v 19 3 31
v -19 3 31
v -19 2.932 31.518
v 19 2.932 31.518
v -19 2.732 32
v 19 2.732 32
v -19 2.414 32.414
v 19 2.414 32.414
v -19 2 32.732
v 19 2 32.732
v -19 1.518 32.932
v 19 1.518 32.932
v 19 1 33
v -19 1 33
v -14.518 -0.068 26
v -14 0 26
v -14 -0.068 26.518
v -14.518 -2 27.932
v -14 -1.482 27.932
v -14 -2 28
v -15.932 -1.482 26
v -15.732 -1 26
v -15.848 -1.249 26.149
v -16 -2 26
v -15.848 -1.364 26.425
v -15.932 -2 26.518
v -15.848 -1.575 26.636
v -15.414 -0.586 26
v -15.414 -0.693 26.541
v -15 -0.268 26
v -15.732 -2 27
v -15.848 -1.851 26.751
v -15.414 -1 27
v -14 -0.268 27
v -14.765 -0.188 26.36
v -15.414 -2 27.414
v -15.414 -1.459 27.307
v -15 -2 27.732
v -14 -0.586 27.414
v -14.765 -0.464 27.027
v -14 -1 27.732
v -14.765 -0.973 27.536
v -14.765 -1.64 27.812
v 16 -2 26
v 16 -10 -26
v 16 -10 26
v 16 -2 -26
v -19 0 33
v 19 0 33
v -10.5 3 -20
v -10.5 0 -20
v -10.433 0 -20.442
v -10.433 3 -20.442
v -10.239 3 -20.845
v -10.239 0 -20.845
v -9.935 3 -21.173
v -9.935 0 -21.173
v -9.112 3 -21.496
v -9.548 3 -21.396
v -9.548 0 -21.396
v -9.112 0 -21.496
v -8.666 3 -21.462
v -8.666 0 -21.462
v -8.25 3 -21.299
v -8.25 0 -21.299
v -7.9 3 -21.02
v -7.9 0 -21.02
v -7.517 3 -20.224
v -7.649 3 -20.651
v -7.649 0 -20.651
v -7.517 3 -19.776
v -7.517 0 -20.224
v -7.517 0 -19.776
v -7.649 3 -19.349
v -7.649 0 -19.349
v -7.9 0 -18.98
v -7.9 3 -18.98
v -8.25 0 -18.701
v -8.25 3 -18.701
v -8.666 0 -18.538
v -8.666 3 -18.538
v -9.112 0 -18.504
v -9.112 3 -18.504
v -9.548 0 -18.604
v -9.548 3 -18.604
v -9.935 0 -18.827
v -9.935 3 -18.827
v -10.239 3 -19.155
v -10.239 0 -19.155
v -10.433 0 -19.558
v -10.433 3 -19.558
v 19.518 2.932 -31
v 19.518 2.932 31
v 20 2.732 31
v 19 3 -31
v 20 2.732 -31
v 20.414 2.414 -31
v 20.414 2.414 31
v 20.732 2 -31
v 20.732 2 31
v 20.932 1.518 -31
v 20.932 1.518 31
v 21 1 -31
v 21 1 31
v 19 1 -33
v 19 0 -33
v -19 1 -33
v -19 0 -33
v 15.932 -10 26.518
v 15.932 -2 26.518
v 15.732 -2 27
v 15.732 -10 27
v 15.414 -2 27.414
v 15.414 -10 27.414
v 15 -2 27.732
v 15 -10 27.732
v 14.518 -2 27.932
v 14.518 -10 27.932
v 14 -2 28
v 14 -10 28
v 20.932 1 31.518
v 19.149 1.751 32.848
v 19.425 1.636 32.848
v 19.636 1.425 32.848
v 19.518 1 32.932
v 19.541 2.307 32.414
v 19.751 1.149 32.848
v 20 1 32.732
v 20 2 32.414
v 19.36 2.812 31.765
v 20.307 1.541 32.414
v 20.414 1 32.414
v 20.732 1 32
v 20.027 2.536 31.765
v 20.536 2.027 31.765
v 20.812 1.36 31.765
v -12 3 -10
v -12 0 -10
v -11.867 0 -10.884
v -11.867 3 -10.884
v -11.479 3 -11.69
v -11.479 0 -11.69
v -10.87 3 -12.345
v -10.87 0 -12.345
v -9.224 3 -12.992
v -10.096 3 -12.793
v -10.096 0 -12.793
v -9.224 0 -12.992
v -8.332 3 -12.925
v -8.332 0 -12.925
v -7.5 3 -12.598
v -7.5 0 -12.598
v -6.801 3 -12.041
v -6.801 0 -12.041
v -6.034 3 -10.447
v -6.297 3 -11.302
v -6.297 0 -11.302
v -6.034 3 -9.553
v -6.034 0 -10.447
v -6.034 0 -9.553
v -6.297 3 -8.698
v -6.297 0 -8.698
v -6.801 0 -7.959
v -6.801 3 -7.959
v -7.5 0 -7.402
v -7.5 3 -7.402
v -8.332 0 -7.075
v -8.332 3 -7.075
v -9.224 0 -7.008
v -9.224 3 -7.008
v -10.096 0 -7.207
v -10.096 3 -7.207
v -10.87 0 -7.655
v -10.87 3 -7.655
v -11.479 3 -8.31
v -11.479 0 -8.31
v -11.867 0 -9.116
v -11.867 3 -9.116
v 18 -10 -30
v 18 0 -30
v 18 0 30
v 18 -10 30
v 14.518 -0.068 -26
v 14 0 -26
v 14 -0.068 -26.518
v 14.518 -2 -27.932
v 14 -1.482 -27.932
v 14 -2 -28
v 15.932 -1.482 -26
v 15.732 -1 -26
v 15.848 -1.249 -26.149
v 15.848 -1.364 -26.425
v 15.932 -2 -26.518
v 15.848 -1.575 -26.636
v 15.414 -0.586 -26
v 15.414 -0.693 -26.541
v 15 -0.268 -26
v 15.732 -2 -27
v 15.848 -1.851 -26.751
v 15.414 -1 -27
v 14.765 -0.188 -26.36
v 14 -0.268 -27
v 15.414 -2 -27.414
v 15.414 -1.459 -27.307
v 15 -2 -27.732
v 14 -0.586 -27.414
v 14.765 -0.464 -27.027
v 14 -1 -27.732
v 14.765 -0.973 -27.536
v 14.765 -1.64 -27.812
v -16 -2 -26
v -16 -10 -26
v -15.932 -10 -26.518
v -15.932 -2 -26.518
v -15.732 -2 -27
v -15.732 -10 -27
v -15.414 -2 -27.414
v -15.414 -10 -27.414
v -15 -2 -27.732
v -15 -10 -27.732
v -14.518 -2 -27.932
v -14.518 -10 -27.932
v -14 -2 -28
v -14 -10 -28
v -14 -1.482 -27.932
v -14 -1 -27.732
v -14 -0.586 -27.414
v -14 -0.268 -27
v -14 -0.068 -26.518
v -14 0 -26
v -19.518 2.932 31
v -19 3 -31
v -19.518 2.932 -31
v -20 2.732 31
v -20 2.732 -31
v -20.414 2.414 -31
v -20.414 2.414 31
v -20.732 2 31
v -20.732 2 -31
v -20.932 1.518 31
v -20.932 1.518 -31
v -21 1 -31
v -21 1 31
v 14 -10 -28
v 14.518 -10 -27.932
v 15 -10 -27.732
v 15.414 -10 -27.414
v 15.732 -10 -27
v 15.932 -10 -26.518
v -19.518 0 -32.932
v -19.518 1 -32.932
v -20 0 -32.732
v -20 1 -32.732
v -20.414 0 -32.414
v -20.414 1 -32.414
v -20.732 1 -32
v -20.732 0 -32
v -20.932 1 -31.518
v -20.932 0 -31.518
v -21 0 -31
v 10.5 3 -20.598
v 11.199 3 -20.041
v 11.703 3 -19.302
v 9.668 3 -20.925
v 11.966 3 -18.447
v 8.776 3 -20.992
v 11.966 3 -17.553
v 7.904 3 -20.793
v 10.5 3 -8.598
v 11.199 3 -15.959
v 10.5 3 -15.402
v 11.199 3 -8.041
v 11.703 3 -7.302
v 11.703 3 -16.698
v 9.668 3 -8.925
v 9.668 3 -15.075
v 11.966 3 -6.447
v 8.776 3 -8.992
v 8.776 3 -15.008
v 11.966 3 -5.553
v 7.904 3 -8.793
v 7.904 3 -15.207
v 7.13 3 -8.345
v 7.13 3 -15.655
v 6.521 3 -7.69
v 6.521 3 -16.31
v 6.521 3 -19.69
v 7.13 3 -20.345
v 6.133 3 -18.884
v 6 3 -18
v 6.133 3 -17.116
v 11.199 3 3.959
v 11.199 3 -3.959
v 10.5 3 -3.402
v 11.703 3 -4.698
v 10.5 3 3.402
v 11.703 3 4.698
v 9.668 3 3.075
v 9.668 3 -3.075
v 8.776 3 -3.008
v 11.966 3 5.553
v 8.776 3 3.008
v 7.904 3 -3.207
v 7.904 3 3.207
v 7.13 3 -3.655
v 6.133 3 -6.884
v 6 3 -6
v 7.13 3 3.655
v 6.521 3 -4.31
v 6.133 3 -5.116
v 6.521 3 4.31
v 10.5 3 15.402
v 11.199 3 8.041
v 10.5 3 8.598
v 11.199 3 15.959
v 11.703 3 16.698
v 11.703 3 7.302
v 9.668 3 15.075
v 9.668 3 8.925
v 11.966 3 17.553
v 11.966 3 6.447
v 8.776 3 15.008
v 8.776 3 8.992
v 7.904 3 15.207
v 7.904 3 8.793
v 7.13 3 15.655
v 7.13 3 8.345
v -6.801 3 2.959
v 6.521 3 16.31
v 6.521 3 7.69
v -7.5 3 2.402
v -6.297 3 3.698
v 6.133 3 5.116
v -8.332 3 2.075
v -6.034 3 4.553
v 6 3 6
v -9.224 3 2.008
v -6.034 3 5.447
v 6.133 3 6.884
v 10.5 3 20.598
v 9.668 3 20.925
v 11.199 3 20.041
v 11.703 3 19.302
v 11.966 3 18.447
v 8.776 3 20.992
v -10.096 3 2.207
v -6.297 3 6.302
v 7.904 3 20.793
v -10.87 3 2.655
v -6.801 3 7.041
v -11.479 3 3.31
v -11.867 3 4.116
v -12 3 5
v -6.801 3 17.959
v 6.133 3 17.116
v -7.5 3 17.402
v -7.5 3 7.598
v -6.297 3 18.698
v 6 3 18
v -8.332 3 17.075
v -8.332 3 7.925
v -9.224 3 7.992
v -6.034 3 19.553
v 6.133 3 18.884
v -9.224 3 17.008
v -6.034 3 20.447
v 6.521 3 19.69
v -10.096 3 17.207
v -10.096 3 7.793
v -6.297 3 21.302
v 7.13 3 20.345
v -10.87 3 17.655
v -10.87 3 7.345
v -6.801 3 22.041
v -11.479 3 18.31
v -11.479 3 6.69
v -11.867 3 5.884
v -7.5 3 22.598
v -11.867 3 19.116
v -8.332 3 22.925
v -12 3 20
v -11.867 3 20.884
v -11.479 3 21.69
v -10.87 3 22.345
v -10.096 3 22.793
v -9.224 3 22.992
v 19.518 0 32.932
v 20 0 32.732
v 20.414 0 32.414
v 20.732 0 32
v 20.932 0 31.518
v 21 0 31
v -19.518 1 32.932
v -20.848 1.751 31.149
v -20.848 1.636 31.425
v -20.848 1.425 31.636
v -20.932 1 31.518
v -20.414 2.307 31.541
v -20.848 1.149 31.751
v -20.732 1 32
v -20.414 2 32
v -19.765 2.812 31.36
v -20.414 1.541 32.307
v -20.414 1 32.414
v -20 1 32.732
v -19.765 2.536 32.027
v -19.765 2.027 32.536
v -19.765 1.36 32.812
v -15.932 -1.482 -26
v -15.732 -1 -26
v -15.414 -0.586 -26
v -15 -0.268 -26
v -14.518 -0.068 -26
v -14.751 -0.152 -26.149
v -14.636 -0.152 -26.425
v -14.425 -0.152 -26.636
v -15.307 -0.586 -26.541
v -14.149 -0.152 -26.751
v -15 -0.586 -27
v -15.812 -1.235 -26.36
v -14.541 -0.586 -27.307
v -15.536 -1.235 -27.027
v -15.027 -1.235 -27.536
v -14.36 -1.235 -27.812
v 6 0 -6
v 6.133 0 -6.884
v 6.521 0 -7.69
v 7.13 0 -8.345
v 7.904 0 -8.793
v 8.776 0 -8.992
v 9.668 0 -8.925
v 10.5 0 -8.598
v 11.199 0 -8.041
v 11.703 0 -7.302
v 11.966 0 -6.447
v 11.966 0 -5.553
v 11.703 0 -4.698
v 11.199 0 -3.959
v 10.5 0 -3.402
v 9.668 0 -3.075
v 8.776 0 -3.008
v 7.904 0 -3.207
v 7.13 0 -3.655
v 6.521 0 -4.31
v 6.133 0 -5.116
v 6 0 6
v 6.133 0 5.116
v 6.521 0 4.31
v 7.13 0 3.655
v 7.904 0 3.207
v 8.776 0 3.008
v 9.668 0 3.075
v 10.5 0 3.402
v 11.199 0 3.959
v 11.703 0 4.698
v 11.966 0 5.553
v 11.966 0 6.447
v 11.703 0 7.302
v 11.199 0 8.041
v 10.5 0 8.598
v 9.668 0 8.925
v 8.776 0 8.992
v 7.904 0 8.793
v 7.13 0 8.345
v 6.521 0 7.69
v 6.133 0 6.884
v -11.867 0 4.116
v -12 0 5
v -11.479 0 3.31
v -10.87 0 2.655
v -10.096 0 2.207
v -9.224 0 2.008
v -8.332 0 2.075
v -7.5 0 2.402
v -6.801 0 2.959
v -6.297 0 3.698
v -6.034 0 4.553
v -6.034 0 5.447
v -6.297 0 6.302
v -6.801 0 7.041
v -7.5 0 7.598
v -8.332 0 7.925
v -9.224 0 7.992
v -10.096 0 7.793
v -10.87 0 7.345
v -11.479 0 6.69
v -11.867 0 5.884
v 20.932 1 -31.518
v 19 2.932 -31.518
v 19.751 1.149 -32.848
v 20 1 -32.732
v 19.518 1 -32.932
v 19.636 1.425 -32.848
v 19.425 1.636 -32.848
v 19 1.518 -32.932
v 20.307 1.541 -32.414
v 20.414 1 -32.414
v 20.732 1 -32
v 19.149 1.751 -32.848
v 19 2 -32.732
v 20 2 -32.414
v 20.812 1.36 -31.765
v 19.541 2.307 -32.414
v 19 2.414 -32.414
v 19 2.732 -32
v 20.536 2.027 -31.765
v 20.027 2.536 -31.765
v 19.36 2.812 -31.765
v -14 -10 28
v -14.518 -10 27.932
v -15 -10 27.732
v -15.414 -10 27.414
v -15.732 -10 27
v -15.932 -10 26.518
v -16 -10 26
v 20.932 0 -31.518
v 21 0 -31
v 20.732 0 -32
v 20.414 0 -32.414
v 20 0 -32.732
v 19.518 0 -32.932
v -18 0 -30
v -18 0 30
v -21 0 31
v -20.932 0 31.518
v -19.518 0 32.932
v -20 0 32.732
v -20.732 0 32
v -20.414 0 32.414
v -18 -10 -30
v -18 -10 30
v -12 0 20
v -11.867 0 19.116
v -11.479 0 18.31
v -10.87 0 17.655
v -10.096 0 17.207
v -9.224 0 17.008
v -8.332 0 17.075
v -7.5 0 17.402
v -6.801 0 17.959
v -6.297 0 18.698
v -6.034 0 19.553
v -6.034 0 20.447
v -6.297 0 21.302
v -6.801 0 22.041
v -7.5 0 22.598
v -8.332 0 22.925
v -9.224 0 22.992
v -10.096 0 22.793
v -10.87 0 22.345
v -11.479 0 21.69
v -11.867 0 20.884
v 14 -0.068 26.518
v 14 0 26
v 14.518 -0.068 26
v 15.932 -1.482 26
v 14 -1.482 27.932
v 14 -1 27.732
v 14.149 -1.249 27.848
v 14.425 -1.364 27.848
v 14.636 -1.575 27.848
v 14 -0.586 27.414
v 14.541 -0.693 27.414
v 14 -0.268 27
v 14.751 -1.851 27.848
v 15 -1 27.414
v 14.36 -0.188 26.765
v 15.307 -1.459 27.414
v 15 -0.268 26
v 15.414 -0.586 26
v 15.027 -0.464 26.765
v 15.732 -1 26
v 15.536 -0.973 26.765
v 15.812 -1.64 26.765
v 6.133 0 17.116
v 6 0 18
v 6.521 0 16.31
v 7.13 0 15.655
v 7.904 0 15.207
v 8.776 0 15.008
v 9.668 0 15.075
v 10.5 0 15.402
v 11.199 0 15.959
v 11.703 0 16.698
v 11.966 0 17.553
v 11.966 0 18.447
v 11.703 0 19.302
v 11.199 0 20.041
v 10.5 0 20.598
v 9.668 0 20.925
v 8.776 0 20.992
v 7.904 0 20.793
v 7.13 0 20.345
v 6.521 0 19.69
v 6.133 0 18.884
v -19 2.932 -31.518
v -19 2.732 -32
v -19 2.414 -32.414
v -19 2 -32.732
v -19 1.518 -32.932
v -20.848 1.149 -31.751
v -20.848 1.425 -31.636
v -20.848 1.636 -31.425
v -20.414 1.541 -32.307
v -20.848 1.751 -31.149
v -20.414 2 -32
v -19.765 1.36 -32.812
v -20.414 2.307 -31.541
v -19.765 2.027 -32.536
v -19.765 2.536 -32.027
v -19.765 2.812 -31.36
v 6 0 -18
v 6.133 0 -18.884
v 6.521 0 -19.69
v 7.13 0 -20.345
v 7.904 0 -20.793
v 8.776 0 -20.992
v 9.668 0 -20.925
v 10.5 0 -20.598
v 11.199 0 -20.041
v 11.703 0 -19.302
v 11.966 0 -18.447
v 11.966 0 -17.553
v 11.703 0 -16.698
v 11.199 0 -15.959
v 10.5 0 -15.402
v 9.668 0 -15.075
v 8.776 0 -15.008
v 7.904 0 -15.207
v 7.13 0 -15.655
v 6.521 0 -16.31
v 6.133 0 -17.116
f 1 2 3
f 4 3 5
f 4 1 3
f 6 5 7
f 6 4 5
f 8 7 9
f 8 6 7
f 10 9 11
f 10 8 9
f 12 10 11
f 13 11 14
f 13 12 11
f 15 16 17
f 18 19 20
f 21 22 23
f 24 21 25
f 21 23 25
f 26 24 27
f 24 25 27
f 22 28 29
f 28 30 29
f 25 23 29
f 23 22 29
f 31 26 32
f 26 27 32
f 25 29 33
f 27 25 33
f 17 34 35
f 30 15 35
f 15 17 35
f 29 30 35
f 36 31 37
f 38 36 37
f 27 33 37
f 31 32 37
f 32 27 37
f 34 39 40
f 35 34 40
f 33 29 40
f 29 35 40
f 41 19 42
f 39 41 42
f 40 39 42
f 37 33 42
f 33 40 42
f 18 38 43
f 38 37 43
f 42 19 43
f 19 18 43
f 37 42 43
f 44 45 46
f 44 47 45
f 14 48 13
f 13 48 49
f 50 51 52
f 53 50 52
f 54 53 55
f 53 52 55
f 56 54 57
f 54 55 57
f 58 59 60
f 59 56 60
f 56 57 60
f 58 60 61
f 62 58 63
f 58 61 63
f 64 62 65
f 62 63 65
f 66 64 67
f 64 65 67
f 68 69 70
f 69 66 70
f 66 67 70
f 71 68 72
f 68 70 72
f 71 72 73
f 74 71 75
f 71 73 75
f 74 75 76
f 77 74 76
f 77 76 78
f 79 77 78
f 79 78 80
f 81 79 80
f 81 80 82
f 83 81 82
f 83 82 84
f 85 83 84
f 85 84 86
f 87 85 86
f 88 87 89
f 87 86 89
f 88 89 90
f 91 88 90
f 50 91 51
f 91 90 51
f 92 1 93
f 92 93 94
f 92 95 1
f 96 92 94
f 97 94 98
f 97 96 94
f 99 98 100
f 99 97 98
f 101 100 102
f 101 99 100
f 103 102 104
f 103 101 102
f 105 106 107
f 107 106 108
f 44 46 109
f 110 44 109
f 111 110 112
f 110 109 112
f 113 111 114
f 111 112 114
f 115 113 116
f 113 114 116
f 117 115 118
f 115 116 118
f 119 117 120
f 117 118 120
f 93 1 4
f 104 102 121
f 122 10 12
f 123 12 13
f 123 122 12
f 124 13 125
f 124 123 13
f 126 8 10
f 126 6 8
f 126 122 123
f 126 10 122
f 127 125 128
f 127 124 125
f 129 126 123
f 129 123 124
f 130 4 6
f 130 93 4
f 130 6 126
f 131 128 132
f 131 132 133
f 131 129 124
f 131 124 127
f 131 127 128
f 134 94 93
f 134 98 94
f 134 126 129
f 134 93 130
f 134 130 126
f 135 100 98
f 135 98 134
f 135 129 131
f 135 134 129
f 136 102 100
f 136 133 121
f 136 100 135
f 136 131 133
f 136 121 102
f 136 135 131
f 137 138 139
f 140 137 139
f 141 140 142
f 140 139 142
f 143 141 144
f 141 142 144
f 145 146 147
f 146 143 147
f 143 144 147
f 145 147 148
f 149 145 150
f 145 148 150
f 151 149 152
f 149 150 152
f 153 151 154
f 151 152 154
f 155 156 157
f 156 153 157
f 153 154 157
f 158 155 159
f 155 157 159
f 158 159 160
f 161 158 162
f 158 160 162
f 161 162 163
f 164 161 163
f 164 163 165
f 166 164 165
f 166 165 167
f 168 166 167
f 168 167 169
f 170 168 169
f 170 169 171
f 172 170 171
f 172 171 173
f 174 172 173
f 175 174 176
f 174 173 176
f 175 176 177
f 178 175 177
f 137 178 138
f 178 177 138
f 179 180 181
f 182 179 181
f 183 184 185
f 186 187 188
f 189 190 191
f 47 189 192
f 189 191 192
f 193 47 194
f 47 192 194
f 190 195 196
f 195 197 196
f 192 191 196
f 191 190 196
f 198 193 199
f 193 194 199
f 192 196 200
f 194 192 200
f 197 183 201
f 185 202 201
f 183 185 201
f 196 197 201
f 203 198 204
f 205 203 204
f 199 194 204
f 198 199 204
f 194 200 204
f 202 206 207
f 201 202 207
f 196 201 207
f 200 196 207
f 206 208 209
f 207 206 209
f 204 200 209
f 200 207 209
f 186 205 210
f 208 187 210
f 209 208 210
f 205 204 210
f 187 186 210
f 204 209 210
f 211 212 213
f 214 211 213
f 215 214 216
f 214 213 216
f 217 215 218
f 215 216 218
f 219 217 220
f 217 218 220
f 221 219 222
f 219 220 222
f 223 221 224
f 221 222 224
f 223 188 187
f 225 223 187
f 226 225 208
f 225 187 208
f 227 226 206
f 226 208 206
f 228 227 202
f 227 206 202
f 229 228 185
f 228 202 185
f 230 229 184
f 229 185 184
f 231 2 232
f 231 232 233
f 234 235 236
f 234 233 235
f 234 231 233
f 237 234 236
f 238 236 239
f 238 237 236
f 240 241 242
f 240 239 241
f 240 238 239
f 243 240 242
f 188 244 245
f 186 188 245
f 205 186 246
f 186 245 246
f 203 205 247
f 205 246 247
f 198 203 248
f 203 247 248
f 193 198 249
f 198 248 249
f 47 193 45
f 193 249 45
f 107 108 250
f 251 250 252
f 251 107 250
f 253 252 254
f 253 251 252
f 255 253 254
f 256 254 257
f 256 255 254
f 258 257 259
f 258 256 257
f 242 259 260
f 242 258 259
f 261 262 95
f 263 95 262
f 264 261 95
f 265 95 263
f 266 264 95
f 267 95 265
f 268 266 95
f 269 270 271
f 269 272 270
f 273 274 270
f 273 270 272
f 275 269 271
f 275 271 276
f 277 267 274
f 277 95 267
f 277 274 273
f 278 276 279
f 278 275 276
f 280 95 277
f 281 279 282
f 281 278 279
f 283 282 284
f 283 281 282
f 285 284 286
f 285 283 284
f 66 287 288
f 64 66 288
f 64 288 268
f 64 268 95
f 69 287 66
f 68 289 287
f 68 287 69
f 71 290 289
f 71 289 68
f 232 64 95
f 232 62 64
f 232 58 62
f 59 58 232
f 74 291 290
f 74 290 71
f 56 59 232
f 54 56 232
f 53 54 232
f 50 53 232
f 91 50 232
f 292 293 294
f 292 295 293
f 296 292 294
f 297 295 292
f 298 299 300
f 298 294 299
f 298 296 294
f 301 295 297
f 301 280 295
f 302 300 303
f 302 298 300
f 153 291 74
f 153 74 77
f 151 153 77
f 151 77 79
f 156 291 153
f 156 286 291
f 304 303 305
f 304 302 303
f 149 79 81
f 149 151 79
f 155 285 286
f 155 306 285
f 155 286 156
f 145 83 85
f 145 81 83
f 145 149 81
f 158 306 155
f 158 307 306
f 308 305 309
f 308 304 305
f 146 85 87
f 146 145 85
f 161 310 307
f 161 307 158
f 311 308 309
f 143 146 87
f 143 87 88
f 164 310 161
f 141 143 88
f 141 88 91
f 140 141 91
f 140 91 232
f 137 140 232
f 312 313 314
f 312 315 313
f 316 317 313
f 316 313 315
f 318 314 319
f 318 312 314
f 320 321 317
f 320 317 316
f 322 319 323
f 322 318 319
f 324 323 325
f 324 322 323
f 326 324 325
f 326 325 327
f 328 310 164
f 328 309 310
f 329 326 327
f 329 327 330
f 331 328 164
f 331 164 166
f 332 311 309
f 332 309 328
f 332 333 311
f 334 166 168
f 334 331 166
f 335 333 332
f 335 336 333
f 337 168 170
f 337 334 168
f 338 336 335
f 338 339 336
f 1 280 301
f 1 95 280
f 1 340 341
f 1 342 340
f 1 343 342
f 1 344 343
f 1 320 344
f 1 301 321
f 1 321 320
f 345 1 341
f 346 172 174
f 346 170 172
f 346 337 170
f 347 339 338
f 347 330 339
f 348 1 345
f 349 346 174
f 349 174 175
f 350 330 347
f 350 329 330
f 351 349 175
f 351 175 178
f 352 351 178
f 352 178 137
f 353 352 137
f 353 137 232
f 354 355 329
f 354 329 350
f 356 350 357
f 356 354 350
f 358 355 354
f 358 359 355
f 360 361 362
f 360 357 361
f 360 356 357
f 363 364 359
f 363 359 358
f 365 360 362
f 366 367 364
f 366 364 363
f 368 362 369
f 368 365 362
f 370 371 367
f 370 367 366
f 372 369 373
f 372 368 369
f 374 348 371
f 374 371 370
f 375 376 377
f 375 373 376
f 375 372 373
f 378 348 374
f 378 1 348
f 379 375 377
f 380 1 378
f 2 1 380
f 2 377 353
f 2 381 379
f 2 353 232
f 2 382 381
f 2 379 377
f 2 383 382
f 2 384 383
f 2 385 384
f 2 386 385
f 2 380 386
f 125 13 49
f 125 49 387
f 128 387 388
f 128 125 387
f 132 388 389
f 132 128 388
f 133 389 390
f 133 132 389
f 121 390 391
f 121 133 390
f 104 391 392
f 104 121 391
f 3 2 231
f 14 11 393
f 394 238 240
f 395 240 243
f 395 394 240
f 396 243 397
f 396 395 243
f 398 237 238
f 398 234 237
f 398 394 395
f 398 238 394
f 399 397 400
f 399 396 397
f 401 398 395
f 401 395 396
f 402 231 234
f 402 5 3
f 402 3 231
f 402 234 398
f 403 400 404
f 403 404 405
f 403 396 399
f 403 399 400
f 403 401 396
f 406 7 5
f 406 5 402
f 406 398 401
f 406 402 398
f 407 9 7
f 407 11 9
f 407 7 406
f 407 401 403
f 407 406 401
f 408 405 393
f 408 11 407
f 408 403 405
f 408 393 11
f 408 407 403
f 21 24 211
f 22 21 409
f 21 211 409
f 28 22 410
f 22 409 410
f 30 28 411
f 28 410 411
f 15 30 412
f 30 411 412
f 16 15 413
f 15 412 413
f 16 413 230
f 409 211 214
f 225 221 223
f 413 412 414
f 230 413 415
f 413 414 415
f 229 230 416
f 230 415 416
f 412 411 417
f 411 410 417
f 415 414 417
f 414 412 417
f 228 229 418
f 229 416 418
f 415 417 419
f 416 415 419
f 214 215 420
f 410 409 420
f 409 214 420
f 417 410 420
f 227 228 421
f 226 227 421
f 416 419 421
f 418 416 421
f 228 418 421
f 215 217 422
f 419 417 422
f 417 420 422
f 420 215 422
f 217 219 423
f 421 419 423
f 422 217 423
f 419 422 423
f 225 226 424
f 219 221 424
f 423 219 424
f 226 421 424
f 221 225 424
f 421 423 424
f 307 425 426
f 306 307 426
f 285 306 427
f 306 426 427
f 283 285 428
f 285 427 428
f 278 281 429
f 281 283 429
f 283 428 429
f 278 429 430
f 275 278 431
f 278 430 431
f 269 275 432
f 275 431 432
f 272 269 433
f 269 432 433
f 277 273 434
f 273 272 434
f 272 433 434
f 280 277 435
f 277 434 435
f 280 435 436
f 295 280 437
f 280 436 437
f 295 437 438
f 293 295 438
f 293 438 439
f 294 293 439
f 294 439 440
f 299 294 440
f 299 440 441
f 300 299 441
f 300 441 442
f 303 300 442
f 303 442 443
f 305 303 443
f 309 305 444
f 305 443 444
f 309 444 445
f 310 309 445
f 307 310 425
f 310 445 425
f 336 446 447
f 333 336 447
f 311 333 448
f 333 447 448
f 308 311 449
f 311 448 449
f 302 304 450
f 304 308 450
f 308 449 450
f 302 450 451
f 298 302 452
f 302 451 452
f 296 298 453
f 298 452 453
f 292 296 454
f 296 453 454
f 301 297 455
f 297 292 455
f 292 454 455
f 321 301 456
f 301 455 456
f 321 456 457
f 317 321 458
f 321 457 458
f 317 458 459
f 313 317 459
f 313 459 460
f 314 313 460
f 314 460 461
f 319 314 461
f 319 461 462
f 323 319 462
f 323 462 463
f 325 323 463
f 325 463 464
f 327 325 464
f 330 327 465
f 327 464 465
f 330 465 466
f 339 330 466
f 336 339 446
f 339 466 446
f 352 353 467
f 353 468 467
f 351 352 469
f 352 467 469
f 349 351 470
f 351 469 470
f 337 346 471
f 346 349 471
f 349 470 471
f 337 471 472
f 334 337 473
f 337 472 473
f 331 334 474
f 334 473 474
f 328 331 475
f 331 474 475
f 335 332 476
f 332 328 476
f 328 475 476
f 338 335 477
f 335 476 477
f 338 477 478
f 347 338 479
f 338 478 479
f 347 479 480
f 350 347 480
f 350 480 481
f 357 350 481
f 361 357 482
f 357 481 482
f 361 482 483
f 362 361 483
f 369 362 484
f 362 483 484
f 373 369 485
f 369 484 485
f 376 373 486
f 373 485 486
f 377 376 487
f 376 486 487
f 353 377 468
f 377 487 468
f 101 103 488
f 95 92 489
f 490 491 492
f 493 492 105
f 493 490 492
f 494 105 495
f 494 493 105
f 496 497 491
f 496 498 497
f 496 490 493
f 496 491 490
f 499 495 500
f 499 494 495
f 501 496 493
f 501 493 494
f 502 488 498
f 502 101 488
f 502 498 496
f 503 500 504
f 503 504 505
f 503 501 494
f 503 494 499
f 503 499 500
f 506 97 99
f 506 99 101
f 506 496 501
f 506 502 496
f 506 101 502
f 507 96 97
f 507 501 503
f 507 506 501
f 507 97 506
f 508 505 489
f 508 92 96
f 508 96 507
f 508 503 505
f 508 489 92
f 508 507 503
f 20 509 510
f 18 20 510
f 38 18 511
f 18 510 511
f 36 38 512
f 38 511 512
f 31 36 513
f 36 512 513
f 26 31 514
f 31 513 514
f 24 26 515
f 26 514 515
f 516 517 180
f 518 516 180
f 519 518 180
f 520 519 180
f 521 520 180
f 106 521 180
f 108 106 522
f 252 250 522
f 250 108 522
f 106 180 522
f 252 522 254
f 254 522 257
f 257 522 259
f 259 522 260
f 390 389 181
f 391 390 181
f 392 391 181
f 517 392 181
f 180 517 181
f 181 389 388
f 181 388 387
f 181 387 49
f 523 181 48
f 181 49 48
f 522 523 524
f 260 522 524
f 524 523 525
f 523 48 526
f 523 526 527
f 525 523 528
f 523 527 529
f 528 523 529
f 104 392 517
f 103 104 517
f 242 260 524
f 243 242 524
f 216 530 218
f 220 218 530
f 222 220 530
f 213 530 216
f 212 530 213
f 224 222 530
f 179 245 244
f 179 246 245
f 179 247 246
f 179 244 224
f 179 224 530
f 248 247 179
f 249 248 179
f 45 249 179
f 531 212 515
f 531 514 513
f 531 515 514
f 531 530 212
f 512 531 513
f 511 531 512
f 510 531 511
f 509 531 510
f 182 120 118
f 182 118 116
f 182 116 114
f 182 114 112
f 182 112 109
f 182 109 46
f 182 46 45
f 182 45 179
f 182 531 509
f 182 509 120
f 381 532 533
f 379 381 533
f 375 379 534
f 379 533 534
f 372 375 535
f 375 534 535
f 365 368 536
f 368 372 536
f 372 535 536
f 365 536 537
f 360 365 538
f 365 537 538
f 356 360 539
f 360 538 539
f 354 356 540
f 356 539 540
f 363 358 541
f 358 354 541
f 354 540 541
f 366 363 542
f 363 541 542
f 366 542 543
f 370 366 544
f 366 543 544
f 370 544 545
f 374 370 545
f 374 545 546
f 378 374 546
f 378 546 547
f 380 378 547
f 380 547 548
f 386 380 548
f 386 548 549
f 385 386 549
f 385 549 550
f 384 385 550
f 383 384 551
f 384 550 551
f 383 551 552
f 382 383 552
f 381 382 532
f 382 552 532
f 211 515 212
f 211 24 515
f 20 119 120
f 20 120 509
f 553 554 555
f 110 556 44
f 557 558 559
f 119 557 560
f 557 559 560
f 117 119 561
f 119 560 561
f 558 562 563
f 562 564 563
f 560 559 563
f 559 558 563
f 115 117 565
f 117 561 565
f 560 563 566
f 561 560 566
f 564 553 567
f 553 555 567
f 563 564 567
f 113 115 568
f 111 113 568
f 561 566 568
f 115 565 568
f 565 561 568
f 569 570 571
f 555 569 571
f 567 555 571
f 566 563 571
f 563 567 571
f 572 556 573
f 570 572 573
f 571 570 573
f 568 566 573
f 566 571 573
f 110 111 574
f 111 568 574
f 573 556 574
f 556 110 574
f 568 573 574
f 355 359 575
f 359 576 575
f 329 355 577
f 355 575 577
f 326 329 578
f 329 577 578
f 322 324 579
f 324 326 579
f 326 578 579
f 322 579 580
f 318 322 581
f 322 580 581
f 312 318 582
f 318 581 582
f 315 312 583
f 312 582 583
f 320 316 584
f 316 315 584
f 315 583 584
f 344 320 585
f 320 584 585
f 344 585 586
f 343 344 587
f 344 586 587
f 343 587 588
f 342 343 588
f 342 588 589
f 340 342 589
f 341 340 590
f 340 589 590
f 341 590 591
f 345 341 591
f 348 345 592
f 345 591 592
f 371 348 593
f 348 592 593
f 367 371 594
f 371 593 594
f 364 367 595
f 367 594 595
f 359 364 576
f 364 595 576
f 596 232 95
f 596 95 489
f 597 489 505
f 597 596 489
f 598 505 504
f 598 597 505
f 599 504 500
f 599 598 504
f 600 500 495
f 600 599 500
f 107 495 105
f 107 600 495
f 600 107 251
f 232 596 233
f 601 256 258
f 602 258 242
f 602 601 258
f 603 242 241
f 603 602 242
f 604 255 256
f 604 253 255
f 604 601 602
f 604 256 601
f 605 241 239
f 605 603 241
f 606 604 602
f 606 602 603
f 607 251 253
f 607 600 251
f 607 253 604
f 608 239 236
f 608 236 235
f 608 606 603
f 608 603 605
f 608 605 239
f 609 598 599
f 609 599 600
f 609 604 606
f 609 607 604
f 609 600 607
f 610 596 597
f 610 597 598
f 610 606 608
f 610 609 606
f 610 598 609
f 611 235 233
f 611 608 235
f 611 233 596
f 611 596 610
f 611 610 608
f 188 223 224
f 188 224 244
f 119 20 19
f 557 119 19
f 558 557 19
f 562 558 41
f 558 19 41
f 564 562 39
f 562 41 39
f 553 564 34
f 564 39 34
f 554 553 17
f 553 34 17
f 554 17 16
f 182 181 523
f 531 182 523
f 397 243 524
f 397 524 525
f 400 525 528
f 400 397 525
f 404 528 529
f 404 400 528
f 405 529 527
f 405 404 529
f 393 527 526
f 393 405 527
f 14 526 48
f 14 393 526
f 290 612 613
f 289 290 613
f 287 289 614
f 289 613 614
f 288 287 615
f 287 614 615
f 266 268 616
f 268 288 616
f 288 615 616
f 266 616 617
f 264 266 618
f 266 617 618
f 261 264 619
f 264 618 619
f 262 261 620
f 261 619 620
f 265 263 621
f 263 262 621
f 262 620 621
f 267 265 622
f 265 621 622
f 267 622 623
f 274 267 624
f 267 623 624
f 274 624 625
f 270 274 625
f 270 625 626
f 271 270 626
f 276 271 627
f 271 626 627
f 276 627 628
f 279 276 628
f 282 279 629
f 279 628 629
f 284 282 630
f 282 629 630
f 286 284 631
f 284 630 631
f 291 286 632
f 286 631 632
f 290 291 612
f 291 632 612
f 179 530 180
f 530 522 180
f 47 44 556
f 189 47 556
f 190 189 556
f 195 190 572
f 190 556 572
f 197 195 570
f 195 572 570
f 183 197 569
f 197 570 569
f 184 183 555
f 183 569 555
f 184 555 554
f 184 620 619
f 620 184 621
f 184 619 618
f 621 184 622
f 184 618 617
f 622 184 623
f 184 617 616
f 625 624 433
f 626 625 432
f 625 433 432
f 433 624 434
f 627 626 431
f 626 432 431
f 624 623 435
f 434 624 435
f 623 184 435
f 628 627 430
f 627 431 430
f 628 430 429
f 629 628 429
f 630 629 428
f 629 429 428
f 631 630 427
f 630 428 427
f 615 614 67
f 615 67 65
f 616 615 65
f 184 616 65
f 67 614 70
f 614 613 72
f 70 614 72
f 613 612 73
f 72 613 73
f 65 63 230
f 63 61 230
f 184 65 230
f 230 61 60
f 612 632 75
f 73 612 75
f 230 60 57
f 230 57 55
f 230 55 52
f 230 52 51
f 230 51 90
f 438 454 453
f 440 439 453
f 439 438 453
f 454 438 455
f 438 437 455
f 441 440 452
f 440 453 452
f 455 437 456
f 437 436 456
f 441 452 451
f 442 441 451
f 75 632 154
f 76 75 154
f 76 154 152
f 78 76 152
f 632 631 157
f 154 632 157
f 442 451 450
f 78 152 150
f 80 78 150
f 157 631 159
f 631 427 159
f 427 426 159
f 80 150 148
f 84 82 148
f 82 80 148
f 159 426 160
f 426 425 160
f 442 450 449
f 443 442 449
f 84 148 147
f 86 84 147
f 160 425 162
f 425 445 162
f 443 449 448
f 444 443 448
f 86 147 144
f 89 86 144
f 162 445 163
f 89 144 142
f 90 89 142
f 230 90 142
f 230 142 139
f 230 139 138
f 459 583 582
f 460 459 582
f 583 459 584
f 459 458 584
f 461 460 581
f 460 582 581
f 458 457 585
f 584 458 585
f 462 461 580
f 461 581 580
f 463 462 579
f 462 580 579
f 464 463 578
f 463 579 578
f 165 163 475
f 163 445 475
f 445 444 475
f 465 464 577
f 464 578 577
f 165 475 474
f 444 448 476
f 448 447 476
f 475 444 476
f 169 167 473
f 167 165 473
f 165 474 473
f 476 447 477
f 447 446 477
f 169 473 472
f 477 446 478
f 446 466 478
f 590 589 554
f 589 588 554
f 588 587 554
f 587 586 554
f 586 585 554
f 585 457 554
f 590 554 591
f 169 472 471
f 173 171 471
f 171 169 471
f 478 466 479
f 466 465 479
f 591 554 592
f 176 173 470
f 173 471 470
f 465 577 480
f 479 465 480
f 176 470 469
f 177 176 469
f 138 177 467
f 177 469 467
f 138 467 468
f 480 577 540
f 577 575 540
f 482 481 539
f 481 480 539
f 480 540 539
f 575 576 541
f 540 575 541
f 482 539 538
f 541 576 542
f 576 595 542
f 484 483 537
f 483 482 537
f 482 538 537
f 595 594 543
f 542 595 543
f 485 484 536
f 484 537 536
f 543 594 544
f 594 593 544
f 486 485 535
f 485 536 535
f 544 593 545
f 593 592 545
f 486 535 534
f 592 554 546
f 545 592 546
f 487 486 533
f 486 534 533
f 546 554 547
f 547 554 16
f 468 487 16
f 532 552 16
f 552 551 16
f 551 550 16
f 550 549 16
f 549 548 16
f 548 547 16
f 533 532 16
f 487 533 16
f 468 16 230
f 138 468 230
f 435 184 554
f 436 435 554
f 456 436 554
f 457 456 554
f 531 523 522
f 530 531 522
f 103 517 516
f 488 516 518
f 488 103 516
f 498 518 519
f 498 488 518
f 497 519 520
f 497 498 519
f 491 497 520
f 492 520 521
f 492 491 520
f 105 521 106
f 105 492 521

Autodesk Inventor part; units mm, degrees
ref_plane "YZ Plane" through (0, 0, 0) normal (1, 0, 0) x (0, 1, 0)
ref_plane "XZ Plane" through (0, 0, 0) normal (0, 1, 0) x (-1, 0, 0)
ref_plane "XY Plane" through (0, 0, 0) normal (0, 0, 1) x (1, 0, 0)
sketch "Sketch1" plane through (0, 0, 0) normal (0, 1, 0) x (-1, 0, 0)
  line L0 (18, 30) -> (-18, 30)
  line L1 (-18, 30) -> (-18, -30)
  line L2 (-18, -30) -> (18, -30)
  line L3 (18, -30) -> (18, 30)
  line L4 (18, 30) -> (-18, -30) construction
  line L5 (-18, 30) -> (18, -30) construction
  circle A0 centre (9, 20) radius 3
  circle A1 centre (9, 5) radius 3
  circle A2 centre (-9, 18) radius 3
  circle A3 centre (-9, 6) radius 3
  circle A4 centre (-9, -6) radius 3
  circle A5 centre (-9, -18) radius 3
  circle A6 centre (9, -10) radius 3
  circle A7 centre (9, -20) radius 1.5
  line L6 (21, 33) -> (-21, 33)
  line L7 (-21, 33) -> (-21, -33)
  line L8 (-21, -33) -> (21, -33)
  line L9 (21, -33) -> (21, 33)
  line L10 (21, 33) -> (-21, -33) construction
  line L11 (-21, 33) -> (21, -33) construction
  point P0 (0, 0)
  dimension "d0" = 36
  dimension "d1" = 60
  dimension "d2" = 6
  dimension "d3" = 6
  dimension "d4" = 6
  dimension "d5" = 6
  dimension "d6" = 6
  dimension "d7" = 6
  dimension "d8" = 6
  dimension "d9" = 3
  dimension "d10" = 10
  dimension "d11" = 5
  dimension "d12" = 9
  dimension "d13" = 9
  dimension "d14" = 9
  dimension "d15" = 9
  dimension "d16" = 10
  dimension "d17" = 10
  dimension "d18" = 9
  dimension "d19" = 9
  dimension "d20" = 9
  dimension "d21" = 9
  dimension "d22" = 12
  dimension "d23" = 12
  dimension "d24" = 12
  dimension "d25" = 12
  dimension "d26" = 3
  dimension "d27" = 3
extrude "Extrusion1" add sketch "Sketch1" along normal blind 3 contours L3 L2 L1 L0 | L9 L8 L7 L6
sketch "Sketch2" plane through (0, 0, 0) normal (0, -1, 0) x (1, 0, 0)
  line L0 (18, 30) -> (-18, 30)
  line L1 (-18, 30) -> (-18, -30)
  line L2 (-18, -30) -> (18, -30)
  line L3 (18, -30) -> (18, 30)
  line L4 (18, 30) -> (-18, -30) construction
  line L5 (-18, 30) -> (18, -30) construction
  line L6 (16, 28) -> (-16, 28)
  line L7 (-16, 28) -> (-16, -28)
  line L8 (-16, -28) -> (16, -28)
  line L9 (16, -28) -> (16, 28)
  line L10 (16, 28) -> (-16, -28) construction
  line L11 (-16, 28) -> (16, -28) construction
  point P0 (0, 0)
  dimension "d30" = 36
  dimension "d31" = 60
  dimension "d32" = 2
  dimension "d33" = 2
extrude "Extrusion2" add sketch "Sketch2" along normal blind 10
fillet "Fillet1" radius 2 8 edges at (21, 3, 0) (0, 3, -33) (0, 3, 33) (-21, 3, 0) (21, 1.5, 33) (21, 1.5, -33) (-21, 1.5, -33) (-21, 1.5, 33)
fillet "Fillet2" radius 2 8 edges at (-16, -5, -28) (0, 0, -28) (16, -5, -28) (16, 0, 0) (16, -5, 28) (0, 0, 28) (-16, -5, 28) (-16, 0, 0)
properties part number "vstup"
